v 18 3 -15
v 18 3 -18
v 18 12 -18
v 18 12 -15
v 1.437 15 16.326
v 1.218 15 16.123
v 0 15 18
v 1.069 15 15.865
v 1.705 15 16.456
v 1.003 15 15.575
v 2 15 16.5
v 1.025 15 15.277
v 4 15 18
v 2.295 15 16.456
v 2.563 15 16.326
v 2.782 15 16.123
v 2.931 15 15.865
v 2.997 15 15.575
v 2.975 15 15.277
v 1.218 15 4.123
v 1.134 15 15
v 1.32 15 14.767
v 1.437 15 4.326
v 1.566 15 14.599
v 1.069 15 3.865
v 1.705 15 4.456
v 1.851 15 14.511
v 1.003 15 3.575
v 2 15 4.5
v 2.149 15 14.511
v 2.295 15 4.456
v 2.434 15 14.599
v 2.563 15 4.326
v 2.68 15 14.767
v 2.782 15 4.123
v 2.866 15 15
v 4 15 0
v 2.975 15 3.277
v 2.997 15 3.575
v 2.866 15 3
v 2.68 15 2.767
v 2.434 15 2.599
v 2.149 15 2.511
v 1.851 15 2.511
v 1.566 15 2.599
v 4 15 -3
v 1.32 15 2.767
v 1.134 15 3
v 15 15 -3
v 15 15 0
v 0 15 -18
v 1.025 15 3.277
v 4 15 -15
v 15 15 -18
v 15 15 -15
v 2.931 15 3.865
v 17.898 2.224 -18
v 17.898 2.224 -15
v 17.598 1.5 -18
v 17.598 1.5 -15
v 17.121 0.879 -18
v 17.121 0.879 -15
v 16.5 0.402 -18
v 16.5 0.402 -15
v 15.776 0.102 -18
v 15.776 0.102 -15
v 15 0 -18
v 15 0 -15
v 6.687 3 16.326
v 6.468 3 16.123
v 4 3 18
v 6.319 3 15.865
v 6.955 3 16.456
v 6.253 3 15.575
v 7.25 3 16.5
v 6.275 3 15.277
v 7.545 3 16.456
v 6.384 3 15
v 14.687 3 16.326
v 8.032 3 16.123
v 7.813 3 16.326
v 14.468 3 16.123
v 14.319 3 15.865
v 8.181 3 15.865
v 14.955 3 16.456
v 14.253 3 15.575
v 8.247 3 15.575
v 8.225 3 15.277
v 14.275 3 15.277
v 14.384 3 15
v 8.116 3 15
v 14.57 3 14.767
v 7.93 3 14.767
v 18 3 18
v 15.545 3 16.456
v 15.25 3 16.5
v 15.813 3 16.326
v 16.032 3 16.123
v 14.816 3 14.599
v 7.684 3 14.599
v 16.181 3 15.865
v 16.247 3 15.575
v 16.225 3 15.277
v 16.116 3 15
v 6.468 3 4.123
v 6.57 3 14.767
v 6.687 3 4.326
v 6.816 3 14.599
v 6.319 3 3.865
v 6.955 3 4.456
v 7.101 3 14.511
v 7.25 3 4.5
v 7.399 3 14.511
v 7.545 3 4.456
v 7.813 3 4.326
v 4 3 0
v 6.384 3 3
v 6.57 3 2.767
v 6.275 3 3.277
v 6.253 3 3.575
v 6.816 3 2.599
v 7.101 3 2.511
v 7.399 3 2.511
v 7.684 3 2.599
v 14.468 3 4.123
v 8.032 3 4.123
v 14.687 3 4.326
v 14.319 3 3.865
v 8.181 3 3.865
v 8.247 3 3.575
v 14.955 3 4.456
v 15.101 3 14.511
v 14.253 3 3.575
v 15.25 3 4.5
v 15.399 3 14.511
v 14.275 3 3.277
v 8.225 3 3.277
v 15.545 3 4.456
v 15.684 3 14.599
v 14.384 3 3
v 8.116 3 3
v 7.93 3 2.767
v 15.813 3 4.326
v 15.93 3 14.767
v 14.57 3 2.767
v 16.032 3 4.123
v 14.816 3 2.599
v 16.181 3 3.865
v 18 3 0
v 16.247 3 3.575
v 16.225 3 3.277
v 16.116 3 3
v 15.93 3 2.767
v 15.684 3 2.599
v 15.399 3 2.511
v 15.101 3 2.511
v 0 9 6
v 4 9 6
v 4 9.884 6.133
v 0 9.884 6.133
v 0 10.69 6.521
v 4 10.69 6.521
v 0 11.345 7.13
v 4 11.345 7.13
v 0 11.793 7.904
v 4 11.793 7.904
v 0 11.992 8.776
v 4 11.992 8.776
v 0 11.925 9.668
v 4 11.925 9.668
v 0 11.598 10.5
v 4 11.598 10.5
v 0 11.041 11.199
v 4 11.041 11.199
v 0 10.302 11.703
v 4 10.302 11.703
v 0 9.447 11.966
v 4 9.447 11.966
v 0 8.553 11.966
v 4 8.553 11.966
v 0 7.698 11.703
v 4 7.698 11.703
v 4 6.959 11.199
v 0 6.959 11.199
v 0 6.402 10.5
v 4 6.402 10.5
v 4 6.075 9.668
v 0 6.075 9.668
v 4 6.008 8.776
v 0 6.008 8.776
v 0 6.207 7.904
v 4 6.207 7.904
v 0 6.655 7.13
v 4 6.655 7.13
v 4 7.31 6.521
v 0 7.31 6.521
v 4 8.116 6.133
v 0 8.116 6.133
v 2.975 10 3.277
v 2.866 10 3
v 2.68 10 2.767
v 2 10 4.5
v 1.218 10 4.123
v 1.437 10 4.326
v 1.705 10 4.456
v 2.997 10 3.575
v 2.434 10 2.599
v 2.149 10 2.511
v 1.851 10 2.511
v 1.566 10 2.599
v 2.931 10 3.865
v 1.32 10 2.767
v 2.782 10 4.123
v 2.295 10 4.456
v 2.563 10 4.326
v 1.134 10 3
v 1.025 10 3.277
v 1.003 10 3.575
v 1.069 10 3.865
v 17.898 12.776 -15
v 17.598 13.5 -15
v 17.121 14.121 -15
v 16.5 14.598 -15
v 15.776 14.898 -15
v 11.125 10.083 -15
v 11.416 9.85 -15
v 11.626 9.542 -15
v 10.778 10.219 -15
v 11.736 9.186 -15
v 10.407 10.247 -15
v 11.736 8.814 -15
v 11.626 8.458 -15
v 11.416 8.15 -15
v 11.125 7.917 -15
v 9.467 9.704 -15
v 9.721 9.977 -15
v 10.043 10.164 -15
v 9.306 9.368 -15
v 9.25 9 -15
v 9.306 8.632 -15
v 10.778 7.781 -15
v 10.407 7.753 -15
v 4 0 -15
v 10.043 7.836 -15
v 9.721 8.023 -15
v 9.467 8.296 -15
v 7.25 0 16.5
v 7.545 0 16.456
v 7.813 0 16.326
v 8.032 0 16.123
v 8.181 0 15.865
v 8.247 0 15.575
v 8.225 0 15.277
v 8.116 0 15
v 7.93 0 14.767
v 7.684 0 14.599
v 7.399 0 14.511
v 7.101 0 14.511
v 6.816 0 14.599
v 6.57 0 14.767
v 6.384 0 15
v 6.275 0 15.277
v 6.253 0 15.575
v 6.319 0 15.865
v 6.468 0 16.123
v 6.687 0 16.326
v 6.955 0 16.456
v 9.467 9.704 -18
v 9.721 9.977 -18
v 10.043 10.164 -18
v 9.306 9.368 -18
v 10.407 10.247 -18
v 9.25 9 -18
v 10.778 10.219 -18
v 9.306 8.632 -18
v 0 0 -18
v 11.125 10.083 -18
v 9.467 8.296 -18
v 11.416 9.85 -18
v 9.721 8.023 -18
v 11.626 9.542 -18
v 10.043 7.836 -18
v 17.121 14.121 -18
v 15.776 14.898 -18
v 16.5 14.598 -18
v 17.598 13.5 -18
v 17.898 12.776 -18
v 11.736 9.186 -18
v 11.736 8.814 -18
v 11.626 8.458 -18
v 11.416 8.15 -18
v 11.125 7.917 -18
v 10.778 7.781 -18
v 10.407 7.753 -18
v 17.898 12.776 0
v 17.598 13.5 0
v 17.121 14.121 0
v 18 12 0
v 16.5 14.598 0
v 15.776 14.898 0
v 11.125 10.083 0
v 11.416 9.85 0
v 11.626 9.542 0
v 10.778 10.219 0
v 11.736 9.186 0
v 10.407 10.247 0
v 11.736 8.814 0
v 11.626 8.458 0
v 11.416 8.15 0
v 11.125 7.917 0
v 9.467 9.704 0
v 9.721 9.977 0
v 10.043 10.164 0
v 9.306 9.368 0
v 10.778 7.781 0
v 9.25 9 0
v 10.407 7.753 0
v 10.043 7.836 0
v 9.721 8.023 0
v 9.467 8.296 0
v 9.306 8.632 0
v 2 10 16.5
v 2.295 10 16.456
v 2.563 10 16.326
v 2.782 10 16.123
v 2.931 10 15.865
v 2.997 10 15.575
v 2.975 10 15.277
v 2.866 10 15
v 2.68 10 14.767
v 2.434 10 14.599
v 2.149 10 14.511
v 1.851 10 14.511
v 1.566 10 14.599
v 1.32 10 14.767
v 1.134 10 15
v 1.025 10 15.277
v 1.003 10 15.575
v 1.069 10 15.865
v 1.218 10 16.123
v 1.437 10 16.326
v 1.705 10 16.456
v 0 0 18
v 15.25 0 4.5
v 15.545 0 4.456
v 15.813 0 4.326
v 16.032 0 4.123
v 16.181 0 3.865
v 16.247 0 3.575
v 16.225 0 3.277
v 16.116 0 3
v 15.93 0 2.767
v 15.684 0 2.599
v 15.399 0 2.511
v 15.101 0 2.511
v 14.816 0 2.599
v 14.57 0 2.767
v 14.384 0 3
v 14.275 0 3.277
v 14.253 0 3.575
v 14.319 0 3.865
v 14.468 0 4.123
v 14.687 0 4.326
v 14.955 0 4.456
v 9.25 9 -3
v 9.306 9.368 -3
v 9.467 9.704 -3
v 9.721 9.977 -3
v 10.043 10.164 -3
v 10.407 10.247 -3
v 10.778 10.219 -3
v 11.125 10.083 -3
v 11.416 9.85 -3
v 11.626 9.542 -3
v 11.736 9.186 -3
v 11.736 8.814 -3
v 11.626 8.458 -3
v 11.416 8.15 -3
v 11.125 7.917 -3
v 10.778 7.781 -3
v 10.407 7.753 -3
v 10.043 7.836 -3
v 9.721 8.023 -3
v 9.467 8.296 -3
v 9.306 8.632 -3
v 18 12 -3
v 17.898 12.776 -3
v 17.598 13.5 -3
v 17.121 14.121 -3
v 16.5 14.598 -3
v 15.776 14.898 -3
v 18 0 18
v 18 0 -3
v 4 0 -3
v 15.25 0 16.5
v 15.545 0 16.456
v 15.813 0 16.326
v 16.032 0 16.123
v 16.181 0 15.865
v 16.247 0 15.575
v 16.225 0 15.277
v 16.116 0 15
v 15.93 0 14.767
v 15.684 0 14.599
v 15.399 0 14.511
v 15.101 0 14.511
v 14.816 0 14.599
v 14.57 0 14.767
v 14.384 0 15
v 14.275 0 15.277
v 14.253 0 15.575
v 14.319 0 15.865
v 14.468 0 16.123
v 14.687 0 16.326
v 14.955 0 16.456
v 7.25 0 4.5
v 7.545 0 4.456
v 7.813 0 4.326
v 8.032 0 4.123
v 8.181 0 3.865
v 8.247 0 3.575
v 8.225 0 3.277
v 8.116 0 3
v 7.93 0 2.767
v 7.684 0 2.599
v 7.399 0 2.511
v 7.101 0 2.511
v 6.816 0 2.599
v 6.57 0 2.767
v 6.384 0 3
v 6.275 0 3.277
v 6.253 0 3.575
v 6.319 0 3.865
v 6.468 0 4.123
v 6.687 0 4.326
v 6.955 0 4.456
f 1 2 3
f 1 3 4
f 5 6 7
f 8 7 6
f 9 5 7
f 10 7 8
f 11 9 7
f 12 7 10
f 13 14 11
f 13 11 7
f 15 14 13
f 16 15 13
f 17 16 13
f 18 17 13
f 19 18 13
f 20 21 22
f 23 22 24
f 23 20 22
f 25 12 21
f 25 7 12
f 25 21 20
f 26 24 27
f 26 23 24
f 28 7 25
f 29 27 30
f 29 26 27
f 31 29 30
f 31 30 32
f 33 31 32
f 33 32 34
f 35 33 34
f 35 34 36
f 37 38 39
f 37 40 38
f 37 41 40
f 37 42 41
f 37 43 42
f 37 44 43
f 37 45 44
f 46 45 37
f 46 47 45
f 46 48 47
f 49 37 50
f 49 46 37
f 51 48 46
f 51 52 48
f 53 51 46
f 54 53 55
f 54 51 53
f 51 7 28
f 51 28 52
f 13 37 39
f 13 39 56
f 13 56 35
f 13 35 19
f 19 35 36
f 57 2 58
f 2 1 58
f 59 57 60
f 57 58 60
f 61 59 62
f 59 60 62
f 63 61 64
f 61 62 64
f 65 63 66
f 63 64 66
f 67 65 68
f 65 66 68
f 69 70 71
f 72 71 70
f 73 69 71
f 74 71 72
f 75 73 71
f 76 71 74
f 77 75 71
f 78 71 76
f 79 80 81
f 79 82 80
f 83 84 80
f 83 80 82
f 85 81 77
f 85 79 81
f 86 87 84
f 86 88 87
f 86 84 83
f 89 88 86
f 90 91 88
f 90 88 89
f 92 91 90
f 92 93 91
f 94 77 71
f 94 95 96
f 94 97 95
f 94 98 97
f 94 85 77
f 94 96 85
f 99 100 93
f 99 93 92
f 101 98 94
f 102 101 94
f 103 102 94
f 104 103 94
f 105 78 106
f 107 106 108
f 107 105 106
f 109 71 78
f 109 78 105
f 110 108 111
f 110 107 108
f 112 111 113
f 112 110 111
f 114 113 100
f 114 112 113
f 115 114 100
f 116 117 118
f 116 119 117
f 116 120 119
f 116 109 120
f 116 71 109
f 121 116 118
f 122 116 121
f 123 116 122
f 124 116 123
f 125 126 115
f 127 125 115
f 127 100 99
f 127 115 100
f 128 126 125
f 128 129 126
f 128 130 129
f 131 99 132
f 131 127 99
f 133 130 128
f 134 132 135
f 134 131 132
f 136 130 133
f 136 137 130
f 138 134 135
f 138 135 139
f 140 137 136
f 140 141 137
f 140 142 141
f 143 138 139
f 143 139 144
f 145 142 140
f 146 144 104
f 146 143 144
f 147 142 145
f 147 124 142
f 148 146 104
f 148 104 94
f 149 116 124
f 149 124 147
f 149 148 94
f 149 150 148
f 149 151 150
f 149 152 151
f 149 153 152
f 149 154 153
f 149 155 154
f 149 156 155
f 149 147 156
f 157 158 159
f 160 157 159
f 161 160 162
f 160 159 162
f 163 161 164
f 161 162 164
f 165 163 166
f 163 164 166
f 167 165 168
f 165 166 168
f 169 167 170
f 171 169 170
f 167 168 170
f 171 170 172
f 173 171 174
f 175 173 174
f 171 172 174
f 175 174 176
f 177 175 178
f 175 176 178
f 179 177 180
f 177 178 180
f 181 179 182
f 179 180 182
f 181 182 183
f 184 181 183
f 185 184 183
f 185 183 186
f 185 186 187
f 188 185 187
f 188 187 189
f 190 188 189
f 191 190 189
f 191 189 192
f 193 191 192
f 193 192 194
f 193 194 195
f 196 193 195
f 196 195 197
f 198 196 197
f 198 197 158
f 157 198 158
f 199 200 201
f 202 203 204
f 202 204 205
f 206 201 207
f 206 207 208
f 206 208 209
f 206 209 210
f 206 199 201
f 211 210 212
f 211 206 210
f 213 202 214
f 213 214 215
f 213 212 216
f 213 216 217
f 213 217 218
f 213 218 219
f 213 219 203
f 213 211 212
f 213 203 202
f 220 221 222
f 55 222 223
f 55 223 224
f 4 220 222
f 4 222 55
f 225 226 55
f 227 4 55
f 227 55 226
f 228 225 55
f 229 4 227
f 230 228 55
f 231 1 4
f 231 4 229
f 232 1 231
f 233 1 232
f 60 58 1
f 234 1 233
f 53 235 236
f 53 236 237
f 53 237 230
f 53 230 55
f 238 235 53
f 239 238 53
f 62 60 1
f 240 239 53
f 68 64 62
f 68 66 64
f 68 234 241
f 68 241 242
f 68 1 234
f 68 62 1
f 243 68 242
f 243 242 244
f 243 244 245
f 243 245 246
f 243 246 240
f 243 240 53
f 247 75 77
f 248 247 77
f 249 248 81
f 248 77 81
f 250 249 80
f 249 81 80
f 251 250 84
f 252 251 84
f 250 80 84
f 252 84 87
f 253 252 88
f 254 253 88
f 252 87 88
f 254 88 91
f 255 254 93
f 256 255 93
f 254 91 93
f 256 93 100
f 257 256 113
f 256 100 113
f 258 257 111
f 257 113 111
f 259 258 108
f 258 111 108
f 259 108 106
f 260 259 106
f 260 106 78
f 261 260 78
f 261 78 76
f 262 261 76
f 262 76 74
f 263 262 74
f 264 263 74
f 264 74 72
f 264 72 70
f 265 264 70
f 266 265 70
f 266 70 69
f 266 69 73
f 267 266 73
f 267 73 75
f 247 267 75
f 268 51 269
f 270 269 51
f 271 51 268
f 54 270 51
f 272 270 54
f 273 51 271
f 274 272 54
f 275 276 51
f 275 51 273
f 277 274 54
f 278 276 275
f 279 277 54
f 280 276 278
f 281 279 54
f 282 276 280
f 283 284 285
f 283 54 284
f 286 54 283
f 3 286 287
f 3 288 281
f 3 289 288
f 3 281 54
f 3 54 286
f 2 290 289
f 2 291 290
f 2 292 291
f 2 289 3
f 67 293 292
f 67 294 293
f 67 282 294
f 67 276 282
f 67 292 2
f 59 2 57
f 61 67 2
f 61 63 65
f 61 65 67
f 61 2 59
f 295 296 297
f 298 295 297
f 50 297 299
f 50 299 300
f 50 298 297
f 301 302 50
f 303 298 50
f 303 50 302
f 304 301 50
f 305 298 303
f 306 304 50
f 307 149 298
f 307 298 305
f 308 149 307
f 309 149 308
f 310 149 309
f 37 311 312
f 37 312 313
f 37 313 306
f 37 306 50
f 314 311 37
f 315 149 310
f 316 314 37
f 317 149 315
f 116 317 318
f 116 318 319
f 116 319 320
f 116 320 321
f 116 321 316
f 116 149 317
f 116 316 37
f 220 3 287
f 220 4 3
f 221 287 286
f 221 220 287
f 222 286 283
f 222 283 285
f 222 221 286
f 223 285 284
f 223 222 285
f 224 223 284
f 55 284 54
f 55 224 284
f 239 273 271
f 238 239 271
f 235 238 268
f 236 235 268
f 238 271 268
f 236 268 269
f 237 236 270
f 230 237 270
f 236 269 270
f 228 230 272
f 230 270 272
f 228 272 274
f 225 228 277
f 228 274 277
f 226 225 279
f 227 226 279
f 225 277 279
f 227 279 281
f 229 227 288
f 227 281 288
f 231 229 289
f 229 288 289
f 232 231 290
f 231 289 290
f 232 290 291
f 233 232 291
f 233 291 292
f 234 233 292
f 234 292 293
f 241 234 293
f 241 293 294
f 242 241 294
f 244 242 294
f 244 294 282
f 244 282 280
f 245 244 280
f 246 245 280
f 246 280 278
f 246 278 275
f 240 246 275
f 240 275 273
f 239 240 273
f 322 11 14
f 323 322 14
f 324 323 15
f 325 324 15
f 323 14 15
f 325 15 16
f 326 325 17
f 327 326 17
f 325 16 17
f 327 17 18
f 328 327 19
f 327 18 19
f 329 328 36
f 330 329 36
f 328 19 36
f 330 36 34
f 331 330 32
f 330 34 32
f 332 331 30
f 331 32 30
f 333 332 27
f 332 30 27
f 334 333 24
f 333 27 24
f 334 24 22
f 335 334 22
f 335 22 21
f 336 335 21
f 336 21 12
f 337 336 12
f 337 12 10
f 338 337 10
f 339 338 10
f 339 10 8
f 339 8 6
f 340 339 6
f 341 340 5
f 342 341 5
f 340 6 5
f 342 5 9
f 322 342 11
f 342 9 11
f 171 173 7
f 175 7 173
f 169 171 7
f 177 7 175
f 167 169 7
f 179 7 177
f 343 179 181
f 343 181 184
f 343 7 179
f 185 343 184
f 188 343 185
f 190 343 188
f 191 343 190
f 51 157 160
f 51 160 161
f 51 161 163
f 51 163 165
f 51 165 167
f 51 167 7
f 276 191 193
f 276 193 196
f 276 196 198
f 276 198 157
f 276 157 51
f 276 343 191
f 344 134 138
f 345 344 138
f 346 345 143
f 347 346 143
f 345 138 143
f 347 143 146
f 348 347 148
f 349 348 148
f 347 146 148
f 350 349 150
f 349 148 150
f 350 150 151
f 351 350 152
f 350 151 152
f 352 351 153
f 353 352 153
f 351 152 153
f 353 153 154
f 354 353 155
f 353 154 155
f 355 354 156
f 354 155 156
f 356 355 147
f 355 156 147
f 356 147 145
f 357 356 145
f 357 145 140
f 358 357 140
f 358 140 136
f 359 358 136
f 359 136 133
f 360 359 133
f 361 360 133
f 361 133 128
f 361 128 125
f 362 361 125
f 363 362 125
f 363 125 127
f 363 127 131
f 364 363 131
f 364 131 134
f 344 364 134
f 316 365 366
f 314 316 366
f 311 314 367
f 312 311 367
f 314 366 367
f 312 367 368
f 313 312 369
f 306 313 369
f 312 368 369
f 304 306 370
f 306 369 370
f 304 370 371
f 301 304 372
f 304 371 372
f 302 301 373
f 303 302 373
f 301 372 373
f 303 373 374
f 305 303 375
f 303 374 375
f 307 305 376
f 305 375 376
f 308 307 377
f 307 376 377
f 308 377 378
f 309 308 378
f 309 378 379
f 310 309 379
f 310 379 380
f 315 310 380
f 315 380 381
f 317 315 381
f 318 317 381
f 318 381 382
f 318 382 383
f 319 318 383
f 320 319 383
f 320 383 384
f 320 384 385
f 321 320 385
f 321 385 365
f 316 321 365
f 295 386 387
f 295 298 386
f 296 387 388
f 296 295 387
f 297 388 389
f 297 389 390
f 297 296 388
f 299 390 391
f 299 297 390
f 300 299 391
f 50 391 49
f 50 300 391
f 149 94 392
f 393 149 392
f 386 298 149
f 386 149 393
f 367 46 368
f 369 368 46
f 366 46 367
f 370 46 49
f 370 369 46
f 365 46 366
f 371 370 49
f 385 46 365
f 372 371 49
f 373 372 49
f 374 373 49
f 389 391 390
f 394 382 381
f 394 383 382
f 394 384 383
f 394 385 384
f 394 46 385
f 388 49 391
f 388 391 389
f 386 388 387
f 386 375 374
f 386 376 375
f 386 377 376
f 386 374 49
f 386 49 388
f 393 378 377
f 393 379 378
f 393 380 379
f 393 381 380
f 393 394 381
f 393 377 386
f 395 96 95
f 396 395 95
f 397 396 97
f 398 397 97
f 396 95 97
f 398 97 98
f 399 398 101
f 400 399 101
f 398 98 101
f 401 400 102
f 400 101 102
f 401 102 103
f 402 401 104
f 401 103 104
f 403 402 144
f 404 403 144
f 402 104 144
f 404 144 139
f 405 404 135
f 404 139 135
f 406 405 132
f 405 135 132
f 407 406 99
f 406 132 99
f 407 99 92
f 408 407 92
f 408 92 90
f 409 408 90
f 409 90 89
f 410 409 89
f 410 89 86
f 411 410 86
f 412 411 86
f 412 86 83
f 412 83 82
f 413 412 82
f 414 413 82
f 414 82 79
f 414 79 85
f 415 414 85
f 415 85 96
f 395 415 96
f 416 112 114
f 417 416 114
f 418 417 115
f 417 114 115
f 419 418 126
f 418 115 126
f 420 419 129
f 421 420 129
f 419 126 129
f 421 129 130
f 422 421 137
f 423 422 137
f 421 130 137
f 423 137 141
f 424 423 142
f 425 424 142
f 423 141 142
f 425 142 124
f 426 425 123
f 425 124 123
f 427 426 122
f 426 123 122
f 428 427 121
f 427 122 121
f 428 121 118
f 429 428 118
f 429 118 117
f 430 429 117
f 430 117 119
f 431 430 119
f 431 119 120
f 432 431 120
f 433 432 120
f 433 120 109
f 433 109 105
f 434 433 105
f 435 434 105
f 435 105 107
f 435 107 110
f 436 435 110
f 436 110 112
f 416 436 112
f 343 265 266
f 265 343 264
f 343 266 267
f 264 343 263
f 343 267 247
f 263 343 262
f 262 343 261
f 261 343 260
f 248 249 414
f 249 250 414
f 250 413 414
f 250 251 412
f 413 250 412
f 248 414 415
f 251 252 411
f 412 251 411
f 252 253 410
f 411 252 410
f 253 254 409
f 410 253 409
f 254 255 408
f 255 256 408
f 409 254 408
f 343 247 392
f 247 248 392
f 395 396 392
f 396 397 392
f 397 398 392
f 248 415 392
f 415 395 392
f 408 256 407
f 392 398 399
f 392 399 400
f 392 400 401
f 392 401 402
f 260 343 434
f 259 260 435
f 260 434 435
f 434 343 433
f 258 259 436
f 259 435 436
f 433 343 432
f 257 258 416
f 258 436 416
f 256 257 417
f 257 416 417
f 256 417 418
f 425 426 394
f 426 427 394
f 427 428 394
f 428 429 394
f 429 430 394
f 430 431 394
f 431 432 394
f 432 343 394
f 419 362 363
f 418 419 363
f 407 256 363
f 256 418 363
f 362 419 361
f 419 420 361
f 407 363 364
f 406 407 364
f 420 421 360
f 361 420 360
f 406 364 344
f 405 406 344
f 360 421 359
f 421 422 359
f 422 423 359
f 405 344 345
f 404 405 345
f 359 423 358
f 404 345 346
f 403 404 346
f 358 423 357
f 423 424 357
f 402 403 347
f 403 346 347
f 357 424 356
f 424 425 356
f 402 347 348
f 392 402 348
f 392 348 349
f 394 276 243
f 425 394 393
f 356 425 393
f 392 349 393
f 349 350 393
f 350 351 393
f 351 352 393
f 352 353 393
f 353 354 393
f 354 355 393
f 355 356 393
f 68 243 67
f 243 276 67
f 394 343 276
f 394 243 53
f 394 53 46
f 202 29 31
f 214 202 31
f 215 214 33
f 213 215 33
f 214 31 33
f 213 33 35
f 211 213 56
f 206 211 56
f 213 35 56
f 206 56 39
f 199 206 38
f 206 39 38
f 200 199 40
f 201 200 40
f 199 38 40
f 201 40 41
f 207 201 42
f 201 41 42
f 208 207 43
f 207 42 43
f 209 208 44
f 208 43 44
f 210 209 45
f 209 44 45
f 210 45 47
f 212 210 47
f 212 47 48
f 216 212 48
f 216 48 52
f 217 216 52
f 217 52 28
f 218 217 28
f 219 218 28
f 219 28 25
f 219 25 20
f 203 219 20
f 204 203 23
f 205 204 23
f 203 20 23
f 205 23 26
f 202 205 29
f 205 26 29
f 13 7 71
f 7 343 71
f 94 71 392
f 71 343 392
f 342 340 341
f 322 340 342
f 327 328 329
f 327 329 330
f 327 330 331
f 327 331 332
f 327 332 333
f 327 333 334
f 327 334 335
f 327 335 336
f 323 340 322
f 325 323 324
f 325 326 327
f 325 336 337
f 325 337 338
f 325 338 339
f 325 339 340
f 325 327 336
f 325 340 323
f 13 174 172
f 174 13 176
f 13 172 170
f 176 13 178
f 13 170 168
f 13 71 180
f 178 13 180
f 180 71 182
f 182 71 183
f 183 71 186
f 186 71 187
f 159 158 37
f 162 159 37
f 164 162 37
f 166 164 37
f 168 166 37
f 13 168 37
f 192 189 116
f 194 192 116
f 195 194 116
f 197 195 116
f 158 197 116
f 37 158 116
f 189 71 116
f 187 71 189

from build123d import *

# Parameters (mm, degrees)
EXTRUDE_2_DEPTH     = 15
FILLET_1_R          = 3
CUT_EXTRUDE_1_REACH = 31.547
SKETCH_4_R          = 1.25
EXTRUDE_START       = -12
SKETCH_5_W          = 18
SKETCH_5_H          = 18
EXTRUDE_3_DEPTH     = 3
SKETCH_6_W          = 4
SKETCH_6_H          = 18
EXTRUDE_5_DEPTH     = 12
SKETCH_8_R          = 3
CUT_EXTRUDE_2_DEPTH = 28.294688128
SKETCH_9_R          = 1
CUT_EXTRUDE_3_DEPTH = 29.142494559
SKETCH_10_R         = 1
CUT_EXTRUDE_4_DEPTH = 5


with BuildPart() as part:
    # 草图2 → 凸台-拉伸2 (new body)
    with BuildSketch(Plane(origin=(0, 0, 0), x_dir=(1, 0, 0), z_dir=(0, 1, 0))):
        Polygon((18, 0), (0, 0), (0, 18), (18, 18), (18, 15), (4, 15), (4, 3), (18, 3), align=None)
    extrude(amount=EXTRUDE_2_DEPTH)

    # 圆角1
    fillet_1_edges = [part.edges().sort_by_distance(p)[0] for p in [
        (18, 0, -16.5),
        (18, 15, -16.5),
        (18, 15, -1.5),
    ]]
    fillet(fillet_1_edges, radius=FILLET_1_R)

    # 切除-拉伸1: up to this face of the body (flat: up to its plane)
    cut_extrude_1_end = Plane(part.part.faces().sort_by_distance((8.939983645, 7.450791047, 0))[0])
    # 草图4 → 切除-拉伸1 (cut, up to the picked face)
    with BuildSketch(Plane(origin=(0, 0, -18), x_dir=(-1, 0, 0), z_dir=(0, 0, -1)), mode=Mode.PRIVATE) as cut_extrude_1_sk1:
        with Locations((-10.5, 9)):
            Circle(SKETCH_4_R)
    cut_extrude_1_tool1 = split(extrude(cut_extrude_1_sk1.sketch, amount=-CUT_EXTRUDE_1_REACH, mode=Mode.PRIVATE), bisect_by=cut_extrude_1_end, keep=Keep.BOTH, mode=Mode.PRIVATE)
    add(cut_extrude_1_tool1.solids().sort_by(Axis((10.5, 9, -18), (0, 0, 1)))[0], mode=Mode.SUBTRACT)

    # 草图5 → 凸台-拉伸3 (add)
    with BuildSketch(Plane(origin=(0, 15, 0), x_dir=(1, 0, 0), z_dir=(0, 1, 0)).offset(EXTRUDE_START)):
        with Locations((9, -9)):
            Rectangle(SKETCH_5_W, SKETCH_5_H)
    extrude(amount=-EXTRUDE_3_DEPTH)

    # 草图6 → 凸台-拉伸5 (add)
    with BuildSketch(Plane(origin=(0, 3, 0), x_dir=(1, 0, 0), z_dir=(0, 1, 0))):
        with Locations((2, -9)):
            Rectangle(SKETCH_6_W, SKETCH_6_H)
    extrude(amount=EXTRUDE_5_DEPTH)

    # 草图8 → 切除-拉伸2 (cut, through all)
    with BuildSketch(Plane(origin=(4, 0, 0), x_dir=(0, 0, -1), z_dir=(1, 0, 0))):
        with Locations((-9, 9)):
            Circle(SKETCH_8_R)
    extrude(amount=-CUT_EXTRUDE_2_DEPTH, mode=Mode.SUBTRACT)

    # 草图9 → 切除-拉伸3 (cut, through all)
    with BuildSketch(Plane(origin=(0, 3, 0), x_dir=(1, 0, 0), z_dir=(0, 1, 0))):
        with Locations(Location((7.25, -15.5, 0), (0, 0, 270))):
            Circle(SKETCH_9_R)
        with Locations(Location((15.25, -15.5, 0), (0, 0, 270))):
            Circle(SKETCH_9_R)
        with Locations(Location((7.25, -3.5, 0), (0, 0, 270))):
            Circle(SKETCH_9_R)
        with Locations(Location((15.25, -3.5, 0), (0, 0, 270))):
            Circle(SKETCH_9_R)
    extrude(amount=-CUT_EXTRUDE_3_DEPTH, mode=Mode.SUBTRACT)

    # 草图10 → 切除-拉伸4 (cut)
    with BuildSketch(Plane(origin=(0, 15, 0), x_dir=(1, 0, 0), z_dir=(0, 1, 0))):
        with Locations(Location((2, -15.5, 0), (0, 0, 270))):
            Circle(SKETCH_10_R)
        with Locations(Location((2, -3.5, 0), (0, 0, 270))):
            Circle(SKETCH_10_R)
    extrude(amount=-CUT_EXTRUDE_4_DEPTH, mode=Mode.SUBTRACT)


solid = part.part
